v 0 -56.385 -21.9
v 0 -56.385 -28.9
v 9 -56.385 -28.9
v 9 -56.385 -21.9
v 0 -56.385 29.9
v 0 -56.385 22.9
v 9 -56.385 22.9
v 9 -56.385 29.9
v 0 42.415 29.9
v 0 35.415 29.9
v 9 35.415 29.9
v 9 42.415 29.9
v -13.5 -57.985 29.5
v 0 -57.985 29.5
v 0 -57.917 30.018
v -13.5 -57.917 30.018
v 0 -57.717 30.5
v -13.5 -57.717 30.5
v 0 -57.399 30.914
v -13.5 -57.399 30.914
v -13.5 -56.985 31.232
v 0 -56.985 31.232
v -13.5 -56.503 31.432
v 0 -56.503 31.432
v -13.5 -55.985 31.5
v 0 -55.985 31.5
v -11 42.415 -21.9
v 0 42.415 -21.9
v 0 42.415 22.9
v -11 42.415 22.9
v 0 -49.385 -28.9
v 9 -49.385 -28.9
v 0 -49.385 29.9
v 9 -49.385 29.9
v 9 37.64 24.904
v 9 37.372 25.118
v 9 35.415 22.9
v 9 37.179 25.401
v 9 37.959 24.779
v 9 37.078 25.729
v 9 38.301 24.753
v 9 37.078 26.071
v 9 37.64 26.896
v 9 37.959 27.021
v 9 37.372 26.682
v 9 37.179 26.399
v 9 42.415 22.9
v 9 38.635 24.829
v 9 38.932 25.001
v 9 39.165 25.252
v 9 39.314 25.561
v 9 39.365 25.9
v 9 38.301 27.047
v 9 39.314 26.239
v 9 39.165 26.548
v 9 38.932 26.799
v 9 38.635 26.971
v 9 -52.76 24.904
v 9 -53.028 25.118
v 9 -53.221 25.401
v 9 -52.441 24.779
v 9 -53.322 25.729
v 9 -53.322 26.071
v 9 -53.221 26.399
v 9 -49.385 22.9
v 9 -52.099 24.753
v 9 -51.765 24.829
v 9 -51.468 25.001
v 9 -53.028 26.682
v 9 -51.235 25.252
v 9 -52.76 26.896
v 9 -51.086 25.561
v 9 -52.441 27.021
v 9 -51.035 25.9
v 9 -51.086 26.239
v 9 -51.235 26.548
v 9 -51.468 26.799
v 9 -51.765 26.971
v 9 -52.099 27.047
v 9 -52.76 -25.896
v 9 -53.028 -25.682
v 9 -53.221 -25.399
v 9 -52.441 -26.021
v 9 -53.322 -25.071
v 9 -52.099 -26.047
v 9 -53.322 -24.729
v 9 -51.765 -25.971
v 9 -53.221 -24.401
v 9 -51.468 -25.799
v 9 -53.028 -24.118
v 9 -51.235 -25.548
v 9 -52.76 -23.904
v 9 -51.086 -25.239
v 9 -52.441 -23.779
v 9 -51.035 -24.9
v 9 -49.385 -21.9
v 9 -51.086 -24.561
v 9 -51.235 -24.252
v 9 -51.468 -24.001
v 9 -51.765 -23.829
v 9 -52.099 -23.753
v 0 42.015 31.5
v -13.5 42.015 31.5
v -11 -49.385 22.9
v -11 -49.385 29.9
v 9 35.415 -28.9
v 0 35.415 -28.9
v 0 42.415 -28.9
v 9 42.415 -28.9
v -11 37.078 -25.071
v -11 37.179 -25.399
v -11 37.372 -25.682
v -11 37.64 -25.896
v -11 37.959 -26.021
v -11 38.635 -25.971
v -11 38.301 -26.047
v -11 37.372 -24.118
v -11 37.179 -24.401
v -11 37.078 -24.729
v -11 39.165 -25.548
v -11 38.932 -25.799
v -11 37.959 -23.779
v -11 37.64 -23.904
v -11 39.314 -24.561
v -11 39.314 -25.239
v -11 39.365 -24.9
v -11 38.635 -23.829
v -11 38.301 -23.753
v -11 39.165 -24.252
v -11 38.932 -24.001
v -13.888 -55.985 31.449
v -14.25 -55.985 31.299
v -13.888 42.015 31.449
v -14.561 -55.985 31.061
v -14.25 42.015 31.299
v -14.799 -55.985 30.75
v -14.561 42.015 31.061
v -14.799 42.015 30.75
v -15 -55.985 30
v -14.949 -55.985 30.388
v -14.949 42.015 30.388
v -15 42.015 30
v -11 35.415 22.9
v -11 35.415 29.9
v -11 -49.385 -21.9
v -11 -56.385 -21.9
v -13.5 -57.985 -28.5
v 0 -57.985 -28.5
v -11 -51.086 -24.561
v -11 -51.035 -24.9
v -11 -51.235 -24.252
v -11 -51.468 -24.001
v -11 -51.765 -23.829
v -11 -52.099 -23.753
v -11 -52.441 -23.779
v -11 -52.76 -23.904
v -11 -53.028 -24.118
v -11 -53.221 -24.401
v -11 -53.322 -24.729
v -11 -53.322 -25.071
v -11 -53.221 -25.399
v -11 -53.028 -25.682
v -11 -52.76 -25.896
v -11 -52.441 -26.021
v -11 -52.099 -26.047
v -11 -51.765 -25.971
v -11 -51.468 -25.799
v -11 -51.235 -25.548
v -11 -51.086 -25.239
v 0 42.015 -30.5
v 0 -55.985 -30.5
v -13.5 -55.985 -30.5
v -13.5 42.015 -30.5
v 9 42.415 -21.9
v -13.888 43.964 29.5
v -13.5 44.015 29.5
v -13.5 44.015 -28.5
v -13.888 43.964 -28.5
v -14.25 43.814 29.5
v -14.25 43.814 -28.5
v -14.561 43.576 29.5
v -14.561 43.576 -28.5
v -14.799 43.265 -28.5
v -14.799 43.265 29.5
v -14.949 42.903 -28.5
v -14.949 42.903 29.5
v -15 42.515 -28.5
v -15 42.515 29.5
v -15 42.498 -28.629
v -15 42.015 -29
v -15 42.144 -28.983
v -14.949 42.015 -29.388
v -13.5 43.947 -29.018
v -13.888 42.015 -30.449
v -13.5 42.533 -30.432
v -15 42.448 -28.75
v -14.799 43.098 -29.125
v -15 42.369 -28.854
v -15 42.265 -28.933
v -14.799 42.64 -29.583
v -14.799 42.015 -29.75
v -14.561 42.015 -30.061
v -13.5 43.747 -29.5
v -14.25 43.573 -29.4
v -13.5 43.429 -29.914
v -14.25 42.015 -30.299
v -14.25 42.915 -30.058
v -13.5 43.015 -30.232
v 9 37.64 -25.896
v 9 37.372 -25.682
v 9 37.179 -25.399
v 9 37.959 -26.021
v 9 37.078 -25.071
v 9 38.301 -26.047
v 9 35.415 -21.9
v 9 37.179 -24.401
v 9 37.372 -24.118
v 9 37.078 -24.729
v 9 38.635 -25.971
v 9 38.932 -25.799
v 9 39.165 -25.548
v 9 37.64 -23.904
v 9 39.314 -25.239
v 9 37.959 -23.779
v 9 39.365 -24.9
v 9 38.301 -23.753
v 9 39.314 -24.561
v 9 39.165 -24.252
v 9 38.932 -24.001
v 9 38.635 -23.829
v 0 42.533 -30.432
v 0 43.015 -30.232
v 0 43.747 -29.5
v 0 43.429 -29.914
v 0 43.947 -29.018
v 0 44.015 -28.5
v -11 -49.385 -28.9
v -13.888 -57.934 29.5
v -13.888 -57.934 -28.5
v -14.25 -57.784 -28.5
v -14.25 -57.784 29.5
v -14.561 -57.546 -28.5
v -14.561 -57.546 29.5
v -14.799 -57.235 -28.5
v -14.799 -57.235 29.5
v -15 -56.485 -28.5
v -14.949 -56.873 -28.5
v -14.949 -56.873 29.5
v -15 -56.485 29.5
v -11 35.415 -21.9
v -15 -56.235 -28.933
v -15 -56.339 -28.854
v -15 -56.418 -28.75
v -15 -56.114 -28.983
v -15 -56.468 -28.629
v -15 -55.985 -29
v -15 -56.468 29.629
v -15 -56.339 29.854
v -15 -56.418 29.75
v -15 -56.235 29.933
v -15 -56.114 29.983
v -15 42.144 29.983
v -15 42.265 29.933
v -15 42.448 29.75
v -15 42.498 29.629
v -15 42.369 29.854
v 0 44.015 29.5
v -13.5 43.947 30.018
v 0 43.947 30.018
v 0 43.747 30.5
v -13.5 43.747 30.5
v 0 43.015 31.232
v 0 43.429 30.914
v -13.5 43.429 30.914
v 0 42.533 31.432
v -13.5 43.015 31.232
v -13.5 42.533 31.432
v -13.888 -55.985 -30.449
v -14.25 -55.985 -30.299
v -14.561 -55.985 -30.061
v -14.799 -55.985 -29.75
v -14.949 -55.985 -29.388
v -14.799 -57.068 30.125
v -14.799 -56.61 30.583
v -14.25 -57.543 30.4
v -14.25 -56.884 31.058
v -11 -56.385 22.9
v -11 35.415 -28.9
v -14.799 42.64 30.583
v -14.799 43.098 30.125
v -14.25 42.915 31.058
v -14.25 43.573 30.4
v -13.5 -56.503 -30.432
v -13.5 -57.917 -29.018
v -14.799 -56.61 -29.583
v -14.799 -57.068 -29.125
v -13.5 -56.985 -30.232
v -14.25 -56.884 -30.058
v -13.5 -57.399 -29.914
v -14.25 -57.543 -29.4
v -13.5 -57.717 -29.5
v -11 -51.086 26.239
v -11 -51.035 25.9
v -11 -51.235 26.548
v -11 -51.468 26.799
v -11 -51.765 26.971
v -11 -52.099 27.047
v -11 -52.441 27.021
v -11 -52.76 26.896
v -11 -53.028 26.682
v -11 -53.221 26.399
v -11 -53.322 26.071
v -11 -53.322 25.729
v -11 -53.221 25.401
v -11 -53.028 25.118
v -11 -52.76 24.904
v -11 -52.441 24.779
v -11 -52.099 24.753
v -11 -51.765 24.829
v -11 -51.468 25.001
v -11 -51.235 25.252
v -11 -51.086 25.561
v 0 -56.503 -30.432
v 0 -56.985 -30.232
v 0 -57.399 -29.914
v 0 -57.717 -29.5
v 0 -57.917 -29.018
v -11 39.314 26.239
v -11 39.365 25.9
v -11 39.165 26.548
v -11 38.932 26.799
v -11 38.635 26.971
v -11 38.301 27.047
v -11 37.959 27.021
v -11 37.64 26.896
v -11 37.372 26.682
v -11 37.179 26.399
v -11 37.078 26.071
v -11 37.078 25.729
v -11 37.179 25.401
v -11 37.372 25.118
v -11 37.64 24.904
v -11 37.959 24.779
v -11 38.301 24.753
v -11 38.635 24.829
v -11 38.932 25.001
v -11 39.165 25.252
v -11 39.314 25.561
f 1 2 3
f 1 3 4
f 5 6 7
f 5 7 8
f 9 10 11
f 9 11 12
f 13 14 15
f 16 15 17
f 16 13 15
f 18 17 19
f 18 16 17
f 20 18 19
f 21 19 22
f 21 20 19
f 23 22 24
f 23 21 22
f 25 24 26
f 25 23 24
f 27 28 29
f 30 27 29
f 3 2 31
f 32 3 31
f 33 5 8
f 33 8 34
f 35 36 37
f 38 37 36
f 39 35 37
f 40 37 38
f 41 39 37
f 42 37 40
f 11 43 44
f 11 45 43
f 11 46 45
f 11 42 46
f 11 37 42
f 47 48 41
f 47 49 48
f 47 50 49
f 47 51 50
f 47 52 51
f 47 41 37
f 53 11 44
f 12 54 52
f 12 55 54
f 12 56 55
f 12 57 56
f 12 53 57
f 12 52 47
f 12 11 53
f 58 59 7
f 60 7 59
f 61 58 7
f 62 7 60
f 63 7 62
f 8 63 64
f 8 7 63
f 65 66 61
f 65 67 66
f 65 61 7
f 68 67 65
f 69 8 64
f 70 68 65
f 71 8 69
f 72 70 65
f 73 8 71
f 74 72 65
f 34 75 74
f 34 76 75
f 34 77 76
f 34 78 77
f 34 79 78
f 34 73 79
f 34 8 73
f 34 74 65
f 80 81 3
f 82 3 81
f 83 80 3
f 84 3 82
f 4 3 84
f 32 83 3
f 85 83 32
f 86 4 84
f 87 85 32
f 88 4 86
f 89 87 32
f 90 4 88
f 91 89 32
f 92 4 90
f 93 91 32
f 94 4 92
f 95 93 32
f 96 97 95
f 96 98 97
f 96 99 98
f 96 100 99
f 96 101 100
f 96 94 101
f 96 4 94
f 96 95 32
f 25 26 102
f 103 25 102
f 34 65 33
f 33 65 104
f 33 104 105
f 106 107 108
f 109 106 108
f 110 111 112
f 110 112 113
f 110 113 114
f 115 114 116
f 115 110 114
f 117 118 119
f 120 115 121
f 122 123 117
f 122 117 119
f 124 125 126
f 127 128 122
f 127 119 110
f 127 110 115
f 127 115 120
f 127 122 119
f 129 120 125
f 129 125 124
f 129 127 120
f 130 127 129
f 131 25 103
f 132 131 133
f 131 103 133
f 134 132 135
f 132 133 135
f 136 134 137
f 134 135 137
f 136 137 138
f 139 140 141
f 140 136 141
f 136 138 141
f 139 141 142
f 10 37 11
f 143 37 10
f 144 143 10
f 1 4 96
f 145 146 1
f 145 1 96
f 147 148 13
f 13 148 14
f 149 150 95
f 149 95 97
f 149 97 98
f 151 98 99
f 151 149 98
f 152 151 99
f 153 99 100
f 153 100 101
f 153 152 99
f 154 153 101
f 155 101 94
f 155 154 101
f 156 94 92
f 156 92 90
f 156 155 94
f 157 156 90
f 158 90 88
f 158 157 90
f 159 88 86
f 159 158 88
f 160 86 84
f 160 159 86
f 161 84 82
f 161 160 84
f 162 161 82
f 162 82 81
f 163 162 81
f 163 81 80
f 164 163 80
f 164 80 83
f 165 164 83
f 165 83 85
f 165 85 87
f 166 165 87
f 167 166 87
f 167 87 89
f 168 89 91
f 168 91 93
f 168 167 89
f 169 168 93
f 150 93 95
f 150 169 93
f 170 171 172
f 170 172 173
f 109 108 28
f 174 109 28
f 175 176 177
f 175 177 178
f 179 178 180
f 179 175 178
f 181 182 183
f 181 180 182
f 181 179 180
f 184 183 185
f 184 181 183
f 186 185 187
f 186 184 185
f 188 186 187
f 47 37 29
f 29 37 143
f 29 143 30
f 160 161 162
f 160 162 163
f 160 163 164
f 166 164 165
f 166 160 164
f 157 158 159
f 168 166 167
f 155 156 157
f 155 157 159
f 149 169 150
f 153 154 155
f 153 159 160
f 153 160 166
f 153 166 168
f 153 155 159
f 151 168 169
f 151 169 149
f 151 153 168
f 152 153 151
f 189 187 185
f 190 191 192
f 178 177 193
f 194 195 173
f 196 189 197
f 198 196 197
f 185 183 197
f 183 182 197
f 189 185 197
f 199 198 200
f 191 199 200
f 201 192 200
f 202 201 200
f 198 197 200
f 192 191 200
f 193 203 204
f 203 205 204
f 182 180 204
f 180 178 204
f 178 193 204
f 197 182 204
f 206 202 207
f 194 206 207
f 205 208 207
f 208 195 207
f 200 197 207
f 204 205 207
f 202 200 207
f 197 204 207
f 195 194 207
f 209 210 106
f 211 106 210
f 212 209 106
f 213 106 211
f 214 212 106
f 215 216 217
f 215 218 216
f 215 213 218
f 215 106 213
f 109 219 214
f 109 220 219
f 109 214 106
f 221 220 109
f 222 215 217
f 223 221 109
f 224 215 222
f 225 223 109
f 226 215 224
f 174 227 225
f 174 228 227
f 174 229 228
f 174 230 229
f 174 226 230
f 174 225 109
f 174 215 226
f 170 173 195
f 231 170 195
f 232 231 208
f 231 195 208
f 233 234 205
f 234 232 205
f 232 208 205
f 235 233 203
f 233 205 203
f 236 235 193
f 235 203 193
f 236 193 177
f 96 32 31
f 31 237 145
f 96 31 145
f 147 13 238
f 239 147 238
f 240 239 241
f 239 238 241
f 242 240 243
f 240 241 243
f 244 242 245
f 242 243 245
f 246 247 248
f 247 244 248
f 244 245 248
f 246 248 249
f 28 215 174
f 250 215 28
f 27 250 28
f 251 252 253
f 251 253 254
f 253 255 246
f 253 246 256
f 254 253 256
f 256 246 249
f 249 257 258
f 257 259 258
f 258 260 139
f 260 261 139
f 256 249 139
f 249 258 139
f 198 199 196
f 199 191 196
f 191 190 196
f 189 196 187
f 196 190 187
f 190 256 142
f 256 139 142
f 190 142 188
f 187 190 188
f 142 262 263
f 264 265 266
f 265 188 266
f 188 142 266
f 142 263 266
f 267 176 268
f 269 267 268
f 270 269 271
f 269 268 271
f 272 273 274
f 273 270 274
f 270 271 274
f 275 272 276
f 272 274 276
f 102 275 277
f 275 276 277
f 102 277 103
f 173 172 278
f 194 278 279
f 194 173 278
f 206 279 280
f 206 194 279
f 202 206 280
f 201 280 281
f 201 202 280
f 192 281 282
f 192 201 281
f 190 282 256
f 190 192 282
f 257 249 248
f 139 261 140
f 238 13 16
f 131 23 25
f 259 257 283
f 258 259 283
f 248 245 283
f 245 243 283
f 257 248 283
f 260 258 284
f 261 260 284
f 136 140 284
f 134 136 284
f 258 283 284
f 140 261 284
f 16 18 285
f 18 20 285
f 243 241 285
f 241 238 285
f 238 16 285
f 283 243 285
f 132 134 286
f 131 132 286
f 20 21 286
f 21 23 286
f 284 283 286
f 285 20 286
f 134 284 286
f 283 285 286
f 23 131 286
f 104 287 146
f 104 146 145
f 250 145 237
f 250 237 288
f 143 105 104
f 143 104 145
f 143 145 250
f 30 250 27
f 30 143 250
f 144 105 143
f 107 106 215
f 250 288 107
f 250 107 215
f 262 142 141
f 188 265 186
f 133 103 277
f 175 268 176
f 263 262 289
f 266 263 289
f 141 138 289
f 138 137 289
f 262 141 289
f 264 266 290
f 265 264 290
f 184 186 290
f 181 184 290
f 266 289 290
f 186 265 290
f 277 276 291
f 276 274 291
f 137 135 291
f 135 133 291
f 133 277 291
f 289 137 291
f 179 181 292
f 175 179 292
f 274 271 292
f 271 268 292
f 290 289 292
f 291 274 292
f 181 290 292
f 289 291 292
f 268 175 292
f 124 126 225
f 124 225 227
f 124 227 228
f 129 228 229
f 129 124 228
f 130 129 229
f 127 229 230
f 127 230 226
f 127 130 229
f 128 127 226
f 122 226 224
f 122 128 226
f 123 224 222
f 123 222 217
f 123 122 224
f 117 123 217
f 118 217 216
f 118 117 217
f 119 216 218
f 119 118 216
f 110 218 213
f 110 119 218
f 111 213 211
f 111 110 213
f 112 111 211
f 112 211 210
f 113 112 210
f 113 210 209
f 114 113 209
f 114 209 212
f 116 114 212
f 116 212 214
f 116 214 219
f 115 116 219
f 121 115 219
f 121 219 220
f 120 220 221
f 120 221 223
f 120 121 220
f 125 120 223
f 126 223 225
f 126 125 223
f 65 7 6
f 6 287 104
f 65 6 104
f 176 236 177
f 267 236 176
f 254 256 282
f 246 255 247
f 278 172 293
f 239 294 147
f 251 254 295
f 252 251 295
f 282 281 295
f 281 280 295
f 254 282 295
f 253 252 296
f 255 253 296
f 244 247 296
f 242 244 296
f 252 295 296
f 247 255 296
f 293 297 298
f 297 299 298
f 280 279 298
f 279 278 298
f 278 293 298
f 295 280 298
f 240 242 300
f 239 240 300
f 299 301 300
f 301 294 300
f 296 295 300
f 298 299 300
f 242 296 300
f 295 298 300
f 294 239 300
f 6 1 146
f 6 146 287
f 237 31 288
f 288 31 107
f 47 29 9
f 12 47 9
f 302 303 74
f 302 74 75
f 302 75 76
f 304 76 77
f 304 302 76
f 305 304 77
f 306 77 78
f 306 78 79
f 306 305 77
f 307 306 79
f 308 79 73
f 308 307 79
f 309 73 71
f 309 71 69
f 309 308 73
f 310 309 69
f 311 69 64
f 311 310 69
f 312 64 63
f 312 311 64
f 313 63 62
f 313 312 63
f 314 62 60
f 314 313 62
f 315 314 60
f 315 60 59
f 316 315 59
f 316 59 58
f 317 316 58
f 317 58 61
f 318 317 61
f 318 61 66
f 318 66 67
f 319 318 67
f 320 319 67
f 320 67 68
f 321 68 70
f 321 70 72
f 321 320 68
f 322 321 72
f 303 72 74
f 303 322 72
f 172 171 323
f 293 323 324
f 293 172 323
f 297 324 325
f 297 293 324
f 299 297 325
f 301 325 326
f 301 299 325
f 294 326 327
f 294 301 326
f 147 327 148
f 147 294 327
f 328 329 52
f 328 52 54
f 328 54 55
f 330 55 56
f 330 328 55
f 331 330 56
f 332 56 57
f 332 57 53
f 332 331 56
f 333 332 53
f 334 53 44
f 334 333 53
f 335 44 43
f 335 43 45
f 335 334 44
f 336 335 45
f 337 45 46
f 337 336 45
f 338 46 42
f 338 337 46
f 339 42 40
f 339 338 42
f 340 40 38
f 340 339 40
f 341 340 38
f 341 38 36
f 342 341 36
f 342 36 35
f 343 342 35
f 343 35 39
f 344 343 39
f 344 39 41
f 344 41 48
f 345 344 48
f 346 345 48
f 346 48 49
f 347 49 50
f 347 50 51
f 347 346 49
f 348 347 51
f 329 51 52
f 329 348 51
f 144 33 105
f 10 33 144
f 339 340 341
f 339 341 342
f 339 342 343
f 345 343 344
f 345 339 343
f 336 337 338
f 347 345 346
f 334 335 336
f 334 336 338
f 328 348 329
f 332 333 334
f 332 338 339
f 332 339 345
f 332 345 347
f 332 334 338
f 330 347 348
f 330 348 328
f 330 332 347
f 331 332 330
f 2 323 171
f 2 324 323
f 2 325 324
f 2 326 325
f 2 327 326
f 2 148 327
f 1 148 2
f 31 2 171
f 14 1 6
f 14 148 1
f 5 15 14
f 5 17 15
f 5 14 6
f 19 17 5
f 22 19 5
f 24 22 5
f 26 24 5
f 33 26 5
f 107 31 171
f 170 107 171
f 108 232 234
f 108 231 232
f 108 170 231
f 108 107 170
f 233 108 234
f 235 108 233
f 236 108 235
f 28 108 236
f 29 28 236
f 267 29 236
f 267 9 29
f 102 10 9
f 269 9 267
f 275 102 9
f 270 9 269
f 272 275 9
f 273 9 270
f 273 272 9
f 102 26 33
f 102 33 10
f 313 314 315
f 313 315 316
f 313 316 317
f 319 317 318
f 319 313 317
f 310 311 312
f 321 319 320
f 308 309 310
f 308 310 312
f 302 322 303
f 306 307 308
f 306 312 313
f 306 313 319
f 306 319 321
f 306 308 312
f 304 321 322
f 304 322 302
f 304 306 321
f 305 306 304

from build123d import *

# Parameters (mm, degrees)
F0_W         = 102
F0_H         = 62
F1_DEPTH     = 15
F2_R         = 1.5
F3_W         = 98.8
F3_H         = 58.8
F4_DEPTH     = 11
F5_W         = 7
F5_H         = 7
F5_R         = 1.15
F6_DEPTH     = 20
F7_T1_DEPTH  = 20
F7_T4_ANGLE  = 90
F7_T6_ANGLE  = 90
F7_T8_ANGLE  = 90
F7_T10_ANGLE = 90


# Not quite as in the source:
# - a fillet or chamfer that OpenCascade refuses, or shapes differently, is made with other operations: its cross-section is extruded or revolved along the edge and cut away or added
# - a feature names something its author has since deleted; it is built from what else it names


with BuildPart() as f1:
    # F0 (on Right) → F1 (new body)
    with BuildSketch(Plane.YZ):
        with Locations((-6.9849695861, 0.5)):
            Rectangle(F0_W, F0_H)
    extrude(amount=-F1_DEPTH)

    # F2
    f2_edges = [f1.edges().sort_by_distance(p)[0] for p in [
        (-15, -6.98497, 31.5),
        (-15, -57.98497, 0.5),
        (-15, -6.98497, -30.5),
        (-15, 44.01503, 0.5),
    ]]
    fillet(f2_edges, radius=F2_R)

    # F3 (on face) → F4 (cut)
    with BuildSketch(Plane.YZ):
        with Locations((-6.9849695861, 0.5)):
            Rectangle(F3_W, F3_H)
    extrude(amount=-F4_DEPTH, mode=Mode.SUBTRACT)

    # F5 (on face) → F6 (join)
    with BuildSketch(Plane.YZ.offset(-11)):
        with Locations((-52.8849695861, -25.4)):
            Rectangle(F5_W, F5_H)
        with Locations((-52.1849695861, -24.9)):
            Circle(F5_R, mode=Mode.SUBTRACT)
        with Locations((38.9150304139, -25.4)):
            Rectangle(F5_W, F5_H)
        with Locations((38.2150304139, -24.9)):
            Circle(F5_R, mode=Mode.SUBTRACT)
        with Locations((38.9150304139, 26.4)):
            Rectangle(F5_W, F5_H)
        with Locations((38.2150304139, 25.9)):
            Circle(F5_R, mode=Mode.SUBTRACT)
        with Locations((-52.8849695861, 26.4)):
            Rectangle(F5_W, F5_H)
        with Locations((-52.1849695861, 25.9)):
            Circle(F5_R, mode=Mode.SUBTRACT)
    extrude(amount=F6_DEPTH)

    # F7: fillet of radius 2 on 4 edges, made by hand

    # F7_s2 → F7_t1 (cut)
    with BuildSketch(Plane.YZ.offset(-15)):
        with BuildLine():
            ThreePointArc((-55.9849695861, -30.5), (-57.3991831485, -29.9142135624), (-57.9849695861, -28.5))
            Line((-57.9849695861, -28.5), (-57.9849695861, -30.5))
            Line((-57.9849695861, -30.5), (-55.9849695861, -30.5))
        make_face()
        with BuildLine():
            ThreePointArc((-57.9849695861, 29.5), (-57.3991831485, 30.9142135624), (-55.9849695861, 31.5))
            Line((-55.9849695861, 31.5), (-57.9849695861, 31.5))
            Line((-57.9849695861, 31.5), (-57.9849695861, 29.5))
        make_face()
        with BuildLine():
            ThreePointArc((44.0150304139, 29.5), (43.4292439762, 30.9142135624), (42.0150304139, 31.5))
            Line((42.0150304139, 31.5), (44.0150304139, 31.5))
            Line((44.0150304139, 31.5), (44.0150304139, 29.5))
        make_face()
        with BuildLine():
            ThreePointArc((42.0150304139, -30.5), (43.4292439762, -29.9142135624), (44.0150304139, -28.5))
            Line((44.0150304139, -28.5), (44.0150304139, -30.5))
            Line((44.0150304139, -30.5), (42.0150304139, -30.5))
        make_face()
    extrude(amount=F7_T1_DEPTH, mode=Mode.SUBTRACT)

    # F7_s3 → F7_t4 (revolve, cut)
    with BuildSketch(Plane.XY.offset(-28.5)):
        with BuildLine():
            ThreePointArc((-15, 42.5150304139), (-14.5606601718, 43.5756905856), (-13.5, 44.0150304139))
            Line((-13.5, 44.0150304139), (-15, 44.0150304139))
            Line((-15, 44.0150304139), (-15, 42.5150304139))
        make_face()
    revolve(axis=Axis((-15, 42.0150304139, -28.5), (-1, 0, 0)), revolution_arc=F7_T4_ANGLE, mode=Mode.SUBTRACT)

    # F7_s5 → F7_t6 (revolve, cut)
    with BuildSketch(Plane.XZ.offset(-42.0150304139)):
        with BuildLine():
            ThreePointArc((-15, 30), (-14.5606601718, 31.0606601718), (-13.5, 31.5))
            Line((-13.5, 31.5), (-15, 31.5))
            Line((-15, 31.5), (-15, 30))
        make_face()
    revolve(axis=Axis((-15, 42.0150304139, 29.5), (-1, 0, 0)), revolution_arc=F7_T6_ANGLE, mode=Mode.SUBTRACT)

    # F7_s7 → F7_t8 (revolve, cut)
    with BuildSketch(Plane.XY.offset(29.5)):
        with BuildLine():
            ThreePointArc((-15, -56.4849695861), (-14.5606601718, -57.5456297579), (-13.5, -57.9849695861))
            Line((-13.5, -57.9849695861), (-15, -57.9849695861))
            Line((-15, -57.9849695861), (-15, -56.4849695861))
        make_face()
    revolve(axis=Axis((-15, -55.9849695861, 29.5), (-1, 0, 0)), revolution_arc=F7_T8_ANGLE, mode=Mode.SUBTRACT)

    # F7_s9 → F7_t10 (revolve, cut)
    with BuildSketch(Plane.XZ.offset(55.9849695861)):
        with BuildLine():
            ThreePointArc((-15, -29), (-14.5606601718, -30.0606601718), (-13.5, -30.5))
            Line((-13.5, -30.5), (-15, -30.5))
            Line((-15, -30.5), (-15, -29))
        make_face()
    revolve(axis=Axis((-15, -55.9849695861, -28.5), (-1, 0, 0)), revolution_arc=F7_T10_ANGLE, mode=Mode.SUBTRACT)


solid = f1.part
